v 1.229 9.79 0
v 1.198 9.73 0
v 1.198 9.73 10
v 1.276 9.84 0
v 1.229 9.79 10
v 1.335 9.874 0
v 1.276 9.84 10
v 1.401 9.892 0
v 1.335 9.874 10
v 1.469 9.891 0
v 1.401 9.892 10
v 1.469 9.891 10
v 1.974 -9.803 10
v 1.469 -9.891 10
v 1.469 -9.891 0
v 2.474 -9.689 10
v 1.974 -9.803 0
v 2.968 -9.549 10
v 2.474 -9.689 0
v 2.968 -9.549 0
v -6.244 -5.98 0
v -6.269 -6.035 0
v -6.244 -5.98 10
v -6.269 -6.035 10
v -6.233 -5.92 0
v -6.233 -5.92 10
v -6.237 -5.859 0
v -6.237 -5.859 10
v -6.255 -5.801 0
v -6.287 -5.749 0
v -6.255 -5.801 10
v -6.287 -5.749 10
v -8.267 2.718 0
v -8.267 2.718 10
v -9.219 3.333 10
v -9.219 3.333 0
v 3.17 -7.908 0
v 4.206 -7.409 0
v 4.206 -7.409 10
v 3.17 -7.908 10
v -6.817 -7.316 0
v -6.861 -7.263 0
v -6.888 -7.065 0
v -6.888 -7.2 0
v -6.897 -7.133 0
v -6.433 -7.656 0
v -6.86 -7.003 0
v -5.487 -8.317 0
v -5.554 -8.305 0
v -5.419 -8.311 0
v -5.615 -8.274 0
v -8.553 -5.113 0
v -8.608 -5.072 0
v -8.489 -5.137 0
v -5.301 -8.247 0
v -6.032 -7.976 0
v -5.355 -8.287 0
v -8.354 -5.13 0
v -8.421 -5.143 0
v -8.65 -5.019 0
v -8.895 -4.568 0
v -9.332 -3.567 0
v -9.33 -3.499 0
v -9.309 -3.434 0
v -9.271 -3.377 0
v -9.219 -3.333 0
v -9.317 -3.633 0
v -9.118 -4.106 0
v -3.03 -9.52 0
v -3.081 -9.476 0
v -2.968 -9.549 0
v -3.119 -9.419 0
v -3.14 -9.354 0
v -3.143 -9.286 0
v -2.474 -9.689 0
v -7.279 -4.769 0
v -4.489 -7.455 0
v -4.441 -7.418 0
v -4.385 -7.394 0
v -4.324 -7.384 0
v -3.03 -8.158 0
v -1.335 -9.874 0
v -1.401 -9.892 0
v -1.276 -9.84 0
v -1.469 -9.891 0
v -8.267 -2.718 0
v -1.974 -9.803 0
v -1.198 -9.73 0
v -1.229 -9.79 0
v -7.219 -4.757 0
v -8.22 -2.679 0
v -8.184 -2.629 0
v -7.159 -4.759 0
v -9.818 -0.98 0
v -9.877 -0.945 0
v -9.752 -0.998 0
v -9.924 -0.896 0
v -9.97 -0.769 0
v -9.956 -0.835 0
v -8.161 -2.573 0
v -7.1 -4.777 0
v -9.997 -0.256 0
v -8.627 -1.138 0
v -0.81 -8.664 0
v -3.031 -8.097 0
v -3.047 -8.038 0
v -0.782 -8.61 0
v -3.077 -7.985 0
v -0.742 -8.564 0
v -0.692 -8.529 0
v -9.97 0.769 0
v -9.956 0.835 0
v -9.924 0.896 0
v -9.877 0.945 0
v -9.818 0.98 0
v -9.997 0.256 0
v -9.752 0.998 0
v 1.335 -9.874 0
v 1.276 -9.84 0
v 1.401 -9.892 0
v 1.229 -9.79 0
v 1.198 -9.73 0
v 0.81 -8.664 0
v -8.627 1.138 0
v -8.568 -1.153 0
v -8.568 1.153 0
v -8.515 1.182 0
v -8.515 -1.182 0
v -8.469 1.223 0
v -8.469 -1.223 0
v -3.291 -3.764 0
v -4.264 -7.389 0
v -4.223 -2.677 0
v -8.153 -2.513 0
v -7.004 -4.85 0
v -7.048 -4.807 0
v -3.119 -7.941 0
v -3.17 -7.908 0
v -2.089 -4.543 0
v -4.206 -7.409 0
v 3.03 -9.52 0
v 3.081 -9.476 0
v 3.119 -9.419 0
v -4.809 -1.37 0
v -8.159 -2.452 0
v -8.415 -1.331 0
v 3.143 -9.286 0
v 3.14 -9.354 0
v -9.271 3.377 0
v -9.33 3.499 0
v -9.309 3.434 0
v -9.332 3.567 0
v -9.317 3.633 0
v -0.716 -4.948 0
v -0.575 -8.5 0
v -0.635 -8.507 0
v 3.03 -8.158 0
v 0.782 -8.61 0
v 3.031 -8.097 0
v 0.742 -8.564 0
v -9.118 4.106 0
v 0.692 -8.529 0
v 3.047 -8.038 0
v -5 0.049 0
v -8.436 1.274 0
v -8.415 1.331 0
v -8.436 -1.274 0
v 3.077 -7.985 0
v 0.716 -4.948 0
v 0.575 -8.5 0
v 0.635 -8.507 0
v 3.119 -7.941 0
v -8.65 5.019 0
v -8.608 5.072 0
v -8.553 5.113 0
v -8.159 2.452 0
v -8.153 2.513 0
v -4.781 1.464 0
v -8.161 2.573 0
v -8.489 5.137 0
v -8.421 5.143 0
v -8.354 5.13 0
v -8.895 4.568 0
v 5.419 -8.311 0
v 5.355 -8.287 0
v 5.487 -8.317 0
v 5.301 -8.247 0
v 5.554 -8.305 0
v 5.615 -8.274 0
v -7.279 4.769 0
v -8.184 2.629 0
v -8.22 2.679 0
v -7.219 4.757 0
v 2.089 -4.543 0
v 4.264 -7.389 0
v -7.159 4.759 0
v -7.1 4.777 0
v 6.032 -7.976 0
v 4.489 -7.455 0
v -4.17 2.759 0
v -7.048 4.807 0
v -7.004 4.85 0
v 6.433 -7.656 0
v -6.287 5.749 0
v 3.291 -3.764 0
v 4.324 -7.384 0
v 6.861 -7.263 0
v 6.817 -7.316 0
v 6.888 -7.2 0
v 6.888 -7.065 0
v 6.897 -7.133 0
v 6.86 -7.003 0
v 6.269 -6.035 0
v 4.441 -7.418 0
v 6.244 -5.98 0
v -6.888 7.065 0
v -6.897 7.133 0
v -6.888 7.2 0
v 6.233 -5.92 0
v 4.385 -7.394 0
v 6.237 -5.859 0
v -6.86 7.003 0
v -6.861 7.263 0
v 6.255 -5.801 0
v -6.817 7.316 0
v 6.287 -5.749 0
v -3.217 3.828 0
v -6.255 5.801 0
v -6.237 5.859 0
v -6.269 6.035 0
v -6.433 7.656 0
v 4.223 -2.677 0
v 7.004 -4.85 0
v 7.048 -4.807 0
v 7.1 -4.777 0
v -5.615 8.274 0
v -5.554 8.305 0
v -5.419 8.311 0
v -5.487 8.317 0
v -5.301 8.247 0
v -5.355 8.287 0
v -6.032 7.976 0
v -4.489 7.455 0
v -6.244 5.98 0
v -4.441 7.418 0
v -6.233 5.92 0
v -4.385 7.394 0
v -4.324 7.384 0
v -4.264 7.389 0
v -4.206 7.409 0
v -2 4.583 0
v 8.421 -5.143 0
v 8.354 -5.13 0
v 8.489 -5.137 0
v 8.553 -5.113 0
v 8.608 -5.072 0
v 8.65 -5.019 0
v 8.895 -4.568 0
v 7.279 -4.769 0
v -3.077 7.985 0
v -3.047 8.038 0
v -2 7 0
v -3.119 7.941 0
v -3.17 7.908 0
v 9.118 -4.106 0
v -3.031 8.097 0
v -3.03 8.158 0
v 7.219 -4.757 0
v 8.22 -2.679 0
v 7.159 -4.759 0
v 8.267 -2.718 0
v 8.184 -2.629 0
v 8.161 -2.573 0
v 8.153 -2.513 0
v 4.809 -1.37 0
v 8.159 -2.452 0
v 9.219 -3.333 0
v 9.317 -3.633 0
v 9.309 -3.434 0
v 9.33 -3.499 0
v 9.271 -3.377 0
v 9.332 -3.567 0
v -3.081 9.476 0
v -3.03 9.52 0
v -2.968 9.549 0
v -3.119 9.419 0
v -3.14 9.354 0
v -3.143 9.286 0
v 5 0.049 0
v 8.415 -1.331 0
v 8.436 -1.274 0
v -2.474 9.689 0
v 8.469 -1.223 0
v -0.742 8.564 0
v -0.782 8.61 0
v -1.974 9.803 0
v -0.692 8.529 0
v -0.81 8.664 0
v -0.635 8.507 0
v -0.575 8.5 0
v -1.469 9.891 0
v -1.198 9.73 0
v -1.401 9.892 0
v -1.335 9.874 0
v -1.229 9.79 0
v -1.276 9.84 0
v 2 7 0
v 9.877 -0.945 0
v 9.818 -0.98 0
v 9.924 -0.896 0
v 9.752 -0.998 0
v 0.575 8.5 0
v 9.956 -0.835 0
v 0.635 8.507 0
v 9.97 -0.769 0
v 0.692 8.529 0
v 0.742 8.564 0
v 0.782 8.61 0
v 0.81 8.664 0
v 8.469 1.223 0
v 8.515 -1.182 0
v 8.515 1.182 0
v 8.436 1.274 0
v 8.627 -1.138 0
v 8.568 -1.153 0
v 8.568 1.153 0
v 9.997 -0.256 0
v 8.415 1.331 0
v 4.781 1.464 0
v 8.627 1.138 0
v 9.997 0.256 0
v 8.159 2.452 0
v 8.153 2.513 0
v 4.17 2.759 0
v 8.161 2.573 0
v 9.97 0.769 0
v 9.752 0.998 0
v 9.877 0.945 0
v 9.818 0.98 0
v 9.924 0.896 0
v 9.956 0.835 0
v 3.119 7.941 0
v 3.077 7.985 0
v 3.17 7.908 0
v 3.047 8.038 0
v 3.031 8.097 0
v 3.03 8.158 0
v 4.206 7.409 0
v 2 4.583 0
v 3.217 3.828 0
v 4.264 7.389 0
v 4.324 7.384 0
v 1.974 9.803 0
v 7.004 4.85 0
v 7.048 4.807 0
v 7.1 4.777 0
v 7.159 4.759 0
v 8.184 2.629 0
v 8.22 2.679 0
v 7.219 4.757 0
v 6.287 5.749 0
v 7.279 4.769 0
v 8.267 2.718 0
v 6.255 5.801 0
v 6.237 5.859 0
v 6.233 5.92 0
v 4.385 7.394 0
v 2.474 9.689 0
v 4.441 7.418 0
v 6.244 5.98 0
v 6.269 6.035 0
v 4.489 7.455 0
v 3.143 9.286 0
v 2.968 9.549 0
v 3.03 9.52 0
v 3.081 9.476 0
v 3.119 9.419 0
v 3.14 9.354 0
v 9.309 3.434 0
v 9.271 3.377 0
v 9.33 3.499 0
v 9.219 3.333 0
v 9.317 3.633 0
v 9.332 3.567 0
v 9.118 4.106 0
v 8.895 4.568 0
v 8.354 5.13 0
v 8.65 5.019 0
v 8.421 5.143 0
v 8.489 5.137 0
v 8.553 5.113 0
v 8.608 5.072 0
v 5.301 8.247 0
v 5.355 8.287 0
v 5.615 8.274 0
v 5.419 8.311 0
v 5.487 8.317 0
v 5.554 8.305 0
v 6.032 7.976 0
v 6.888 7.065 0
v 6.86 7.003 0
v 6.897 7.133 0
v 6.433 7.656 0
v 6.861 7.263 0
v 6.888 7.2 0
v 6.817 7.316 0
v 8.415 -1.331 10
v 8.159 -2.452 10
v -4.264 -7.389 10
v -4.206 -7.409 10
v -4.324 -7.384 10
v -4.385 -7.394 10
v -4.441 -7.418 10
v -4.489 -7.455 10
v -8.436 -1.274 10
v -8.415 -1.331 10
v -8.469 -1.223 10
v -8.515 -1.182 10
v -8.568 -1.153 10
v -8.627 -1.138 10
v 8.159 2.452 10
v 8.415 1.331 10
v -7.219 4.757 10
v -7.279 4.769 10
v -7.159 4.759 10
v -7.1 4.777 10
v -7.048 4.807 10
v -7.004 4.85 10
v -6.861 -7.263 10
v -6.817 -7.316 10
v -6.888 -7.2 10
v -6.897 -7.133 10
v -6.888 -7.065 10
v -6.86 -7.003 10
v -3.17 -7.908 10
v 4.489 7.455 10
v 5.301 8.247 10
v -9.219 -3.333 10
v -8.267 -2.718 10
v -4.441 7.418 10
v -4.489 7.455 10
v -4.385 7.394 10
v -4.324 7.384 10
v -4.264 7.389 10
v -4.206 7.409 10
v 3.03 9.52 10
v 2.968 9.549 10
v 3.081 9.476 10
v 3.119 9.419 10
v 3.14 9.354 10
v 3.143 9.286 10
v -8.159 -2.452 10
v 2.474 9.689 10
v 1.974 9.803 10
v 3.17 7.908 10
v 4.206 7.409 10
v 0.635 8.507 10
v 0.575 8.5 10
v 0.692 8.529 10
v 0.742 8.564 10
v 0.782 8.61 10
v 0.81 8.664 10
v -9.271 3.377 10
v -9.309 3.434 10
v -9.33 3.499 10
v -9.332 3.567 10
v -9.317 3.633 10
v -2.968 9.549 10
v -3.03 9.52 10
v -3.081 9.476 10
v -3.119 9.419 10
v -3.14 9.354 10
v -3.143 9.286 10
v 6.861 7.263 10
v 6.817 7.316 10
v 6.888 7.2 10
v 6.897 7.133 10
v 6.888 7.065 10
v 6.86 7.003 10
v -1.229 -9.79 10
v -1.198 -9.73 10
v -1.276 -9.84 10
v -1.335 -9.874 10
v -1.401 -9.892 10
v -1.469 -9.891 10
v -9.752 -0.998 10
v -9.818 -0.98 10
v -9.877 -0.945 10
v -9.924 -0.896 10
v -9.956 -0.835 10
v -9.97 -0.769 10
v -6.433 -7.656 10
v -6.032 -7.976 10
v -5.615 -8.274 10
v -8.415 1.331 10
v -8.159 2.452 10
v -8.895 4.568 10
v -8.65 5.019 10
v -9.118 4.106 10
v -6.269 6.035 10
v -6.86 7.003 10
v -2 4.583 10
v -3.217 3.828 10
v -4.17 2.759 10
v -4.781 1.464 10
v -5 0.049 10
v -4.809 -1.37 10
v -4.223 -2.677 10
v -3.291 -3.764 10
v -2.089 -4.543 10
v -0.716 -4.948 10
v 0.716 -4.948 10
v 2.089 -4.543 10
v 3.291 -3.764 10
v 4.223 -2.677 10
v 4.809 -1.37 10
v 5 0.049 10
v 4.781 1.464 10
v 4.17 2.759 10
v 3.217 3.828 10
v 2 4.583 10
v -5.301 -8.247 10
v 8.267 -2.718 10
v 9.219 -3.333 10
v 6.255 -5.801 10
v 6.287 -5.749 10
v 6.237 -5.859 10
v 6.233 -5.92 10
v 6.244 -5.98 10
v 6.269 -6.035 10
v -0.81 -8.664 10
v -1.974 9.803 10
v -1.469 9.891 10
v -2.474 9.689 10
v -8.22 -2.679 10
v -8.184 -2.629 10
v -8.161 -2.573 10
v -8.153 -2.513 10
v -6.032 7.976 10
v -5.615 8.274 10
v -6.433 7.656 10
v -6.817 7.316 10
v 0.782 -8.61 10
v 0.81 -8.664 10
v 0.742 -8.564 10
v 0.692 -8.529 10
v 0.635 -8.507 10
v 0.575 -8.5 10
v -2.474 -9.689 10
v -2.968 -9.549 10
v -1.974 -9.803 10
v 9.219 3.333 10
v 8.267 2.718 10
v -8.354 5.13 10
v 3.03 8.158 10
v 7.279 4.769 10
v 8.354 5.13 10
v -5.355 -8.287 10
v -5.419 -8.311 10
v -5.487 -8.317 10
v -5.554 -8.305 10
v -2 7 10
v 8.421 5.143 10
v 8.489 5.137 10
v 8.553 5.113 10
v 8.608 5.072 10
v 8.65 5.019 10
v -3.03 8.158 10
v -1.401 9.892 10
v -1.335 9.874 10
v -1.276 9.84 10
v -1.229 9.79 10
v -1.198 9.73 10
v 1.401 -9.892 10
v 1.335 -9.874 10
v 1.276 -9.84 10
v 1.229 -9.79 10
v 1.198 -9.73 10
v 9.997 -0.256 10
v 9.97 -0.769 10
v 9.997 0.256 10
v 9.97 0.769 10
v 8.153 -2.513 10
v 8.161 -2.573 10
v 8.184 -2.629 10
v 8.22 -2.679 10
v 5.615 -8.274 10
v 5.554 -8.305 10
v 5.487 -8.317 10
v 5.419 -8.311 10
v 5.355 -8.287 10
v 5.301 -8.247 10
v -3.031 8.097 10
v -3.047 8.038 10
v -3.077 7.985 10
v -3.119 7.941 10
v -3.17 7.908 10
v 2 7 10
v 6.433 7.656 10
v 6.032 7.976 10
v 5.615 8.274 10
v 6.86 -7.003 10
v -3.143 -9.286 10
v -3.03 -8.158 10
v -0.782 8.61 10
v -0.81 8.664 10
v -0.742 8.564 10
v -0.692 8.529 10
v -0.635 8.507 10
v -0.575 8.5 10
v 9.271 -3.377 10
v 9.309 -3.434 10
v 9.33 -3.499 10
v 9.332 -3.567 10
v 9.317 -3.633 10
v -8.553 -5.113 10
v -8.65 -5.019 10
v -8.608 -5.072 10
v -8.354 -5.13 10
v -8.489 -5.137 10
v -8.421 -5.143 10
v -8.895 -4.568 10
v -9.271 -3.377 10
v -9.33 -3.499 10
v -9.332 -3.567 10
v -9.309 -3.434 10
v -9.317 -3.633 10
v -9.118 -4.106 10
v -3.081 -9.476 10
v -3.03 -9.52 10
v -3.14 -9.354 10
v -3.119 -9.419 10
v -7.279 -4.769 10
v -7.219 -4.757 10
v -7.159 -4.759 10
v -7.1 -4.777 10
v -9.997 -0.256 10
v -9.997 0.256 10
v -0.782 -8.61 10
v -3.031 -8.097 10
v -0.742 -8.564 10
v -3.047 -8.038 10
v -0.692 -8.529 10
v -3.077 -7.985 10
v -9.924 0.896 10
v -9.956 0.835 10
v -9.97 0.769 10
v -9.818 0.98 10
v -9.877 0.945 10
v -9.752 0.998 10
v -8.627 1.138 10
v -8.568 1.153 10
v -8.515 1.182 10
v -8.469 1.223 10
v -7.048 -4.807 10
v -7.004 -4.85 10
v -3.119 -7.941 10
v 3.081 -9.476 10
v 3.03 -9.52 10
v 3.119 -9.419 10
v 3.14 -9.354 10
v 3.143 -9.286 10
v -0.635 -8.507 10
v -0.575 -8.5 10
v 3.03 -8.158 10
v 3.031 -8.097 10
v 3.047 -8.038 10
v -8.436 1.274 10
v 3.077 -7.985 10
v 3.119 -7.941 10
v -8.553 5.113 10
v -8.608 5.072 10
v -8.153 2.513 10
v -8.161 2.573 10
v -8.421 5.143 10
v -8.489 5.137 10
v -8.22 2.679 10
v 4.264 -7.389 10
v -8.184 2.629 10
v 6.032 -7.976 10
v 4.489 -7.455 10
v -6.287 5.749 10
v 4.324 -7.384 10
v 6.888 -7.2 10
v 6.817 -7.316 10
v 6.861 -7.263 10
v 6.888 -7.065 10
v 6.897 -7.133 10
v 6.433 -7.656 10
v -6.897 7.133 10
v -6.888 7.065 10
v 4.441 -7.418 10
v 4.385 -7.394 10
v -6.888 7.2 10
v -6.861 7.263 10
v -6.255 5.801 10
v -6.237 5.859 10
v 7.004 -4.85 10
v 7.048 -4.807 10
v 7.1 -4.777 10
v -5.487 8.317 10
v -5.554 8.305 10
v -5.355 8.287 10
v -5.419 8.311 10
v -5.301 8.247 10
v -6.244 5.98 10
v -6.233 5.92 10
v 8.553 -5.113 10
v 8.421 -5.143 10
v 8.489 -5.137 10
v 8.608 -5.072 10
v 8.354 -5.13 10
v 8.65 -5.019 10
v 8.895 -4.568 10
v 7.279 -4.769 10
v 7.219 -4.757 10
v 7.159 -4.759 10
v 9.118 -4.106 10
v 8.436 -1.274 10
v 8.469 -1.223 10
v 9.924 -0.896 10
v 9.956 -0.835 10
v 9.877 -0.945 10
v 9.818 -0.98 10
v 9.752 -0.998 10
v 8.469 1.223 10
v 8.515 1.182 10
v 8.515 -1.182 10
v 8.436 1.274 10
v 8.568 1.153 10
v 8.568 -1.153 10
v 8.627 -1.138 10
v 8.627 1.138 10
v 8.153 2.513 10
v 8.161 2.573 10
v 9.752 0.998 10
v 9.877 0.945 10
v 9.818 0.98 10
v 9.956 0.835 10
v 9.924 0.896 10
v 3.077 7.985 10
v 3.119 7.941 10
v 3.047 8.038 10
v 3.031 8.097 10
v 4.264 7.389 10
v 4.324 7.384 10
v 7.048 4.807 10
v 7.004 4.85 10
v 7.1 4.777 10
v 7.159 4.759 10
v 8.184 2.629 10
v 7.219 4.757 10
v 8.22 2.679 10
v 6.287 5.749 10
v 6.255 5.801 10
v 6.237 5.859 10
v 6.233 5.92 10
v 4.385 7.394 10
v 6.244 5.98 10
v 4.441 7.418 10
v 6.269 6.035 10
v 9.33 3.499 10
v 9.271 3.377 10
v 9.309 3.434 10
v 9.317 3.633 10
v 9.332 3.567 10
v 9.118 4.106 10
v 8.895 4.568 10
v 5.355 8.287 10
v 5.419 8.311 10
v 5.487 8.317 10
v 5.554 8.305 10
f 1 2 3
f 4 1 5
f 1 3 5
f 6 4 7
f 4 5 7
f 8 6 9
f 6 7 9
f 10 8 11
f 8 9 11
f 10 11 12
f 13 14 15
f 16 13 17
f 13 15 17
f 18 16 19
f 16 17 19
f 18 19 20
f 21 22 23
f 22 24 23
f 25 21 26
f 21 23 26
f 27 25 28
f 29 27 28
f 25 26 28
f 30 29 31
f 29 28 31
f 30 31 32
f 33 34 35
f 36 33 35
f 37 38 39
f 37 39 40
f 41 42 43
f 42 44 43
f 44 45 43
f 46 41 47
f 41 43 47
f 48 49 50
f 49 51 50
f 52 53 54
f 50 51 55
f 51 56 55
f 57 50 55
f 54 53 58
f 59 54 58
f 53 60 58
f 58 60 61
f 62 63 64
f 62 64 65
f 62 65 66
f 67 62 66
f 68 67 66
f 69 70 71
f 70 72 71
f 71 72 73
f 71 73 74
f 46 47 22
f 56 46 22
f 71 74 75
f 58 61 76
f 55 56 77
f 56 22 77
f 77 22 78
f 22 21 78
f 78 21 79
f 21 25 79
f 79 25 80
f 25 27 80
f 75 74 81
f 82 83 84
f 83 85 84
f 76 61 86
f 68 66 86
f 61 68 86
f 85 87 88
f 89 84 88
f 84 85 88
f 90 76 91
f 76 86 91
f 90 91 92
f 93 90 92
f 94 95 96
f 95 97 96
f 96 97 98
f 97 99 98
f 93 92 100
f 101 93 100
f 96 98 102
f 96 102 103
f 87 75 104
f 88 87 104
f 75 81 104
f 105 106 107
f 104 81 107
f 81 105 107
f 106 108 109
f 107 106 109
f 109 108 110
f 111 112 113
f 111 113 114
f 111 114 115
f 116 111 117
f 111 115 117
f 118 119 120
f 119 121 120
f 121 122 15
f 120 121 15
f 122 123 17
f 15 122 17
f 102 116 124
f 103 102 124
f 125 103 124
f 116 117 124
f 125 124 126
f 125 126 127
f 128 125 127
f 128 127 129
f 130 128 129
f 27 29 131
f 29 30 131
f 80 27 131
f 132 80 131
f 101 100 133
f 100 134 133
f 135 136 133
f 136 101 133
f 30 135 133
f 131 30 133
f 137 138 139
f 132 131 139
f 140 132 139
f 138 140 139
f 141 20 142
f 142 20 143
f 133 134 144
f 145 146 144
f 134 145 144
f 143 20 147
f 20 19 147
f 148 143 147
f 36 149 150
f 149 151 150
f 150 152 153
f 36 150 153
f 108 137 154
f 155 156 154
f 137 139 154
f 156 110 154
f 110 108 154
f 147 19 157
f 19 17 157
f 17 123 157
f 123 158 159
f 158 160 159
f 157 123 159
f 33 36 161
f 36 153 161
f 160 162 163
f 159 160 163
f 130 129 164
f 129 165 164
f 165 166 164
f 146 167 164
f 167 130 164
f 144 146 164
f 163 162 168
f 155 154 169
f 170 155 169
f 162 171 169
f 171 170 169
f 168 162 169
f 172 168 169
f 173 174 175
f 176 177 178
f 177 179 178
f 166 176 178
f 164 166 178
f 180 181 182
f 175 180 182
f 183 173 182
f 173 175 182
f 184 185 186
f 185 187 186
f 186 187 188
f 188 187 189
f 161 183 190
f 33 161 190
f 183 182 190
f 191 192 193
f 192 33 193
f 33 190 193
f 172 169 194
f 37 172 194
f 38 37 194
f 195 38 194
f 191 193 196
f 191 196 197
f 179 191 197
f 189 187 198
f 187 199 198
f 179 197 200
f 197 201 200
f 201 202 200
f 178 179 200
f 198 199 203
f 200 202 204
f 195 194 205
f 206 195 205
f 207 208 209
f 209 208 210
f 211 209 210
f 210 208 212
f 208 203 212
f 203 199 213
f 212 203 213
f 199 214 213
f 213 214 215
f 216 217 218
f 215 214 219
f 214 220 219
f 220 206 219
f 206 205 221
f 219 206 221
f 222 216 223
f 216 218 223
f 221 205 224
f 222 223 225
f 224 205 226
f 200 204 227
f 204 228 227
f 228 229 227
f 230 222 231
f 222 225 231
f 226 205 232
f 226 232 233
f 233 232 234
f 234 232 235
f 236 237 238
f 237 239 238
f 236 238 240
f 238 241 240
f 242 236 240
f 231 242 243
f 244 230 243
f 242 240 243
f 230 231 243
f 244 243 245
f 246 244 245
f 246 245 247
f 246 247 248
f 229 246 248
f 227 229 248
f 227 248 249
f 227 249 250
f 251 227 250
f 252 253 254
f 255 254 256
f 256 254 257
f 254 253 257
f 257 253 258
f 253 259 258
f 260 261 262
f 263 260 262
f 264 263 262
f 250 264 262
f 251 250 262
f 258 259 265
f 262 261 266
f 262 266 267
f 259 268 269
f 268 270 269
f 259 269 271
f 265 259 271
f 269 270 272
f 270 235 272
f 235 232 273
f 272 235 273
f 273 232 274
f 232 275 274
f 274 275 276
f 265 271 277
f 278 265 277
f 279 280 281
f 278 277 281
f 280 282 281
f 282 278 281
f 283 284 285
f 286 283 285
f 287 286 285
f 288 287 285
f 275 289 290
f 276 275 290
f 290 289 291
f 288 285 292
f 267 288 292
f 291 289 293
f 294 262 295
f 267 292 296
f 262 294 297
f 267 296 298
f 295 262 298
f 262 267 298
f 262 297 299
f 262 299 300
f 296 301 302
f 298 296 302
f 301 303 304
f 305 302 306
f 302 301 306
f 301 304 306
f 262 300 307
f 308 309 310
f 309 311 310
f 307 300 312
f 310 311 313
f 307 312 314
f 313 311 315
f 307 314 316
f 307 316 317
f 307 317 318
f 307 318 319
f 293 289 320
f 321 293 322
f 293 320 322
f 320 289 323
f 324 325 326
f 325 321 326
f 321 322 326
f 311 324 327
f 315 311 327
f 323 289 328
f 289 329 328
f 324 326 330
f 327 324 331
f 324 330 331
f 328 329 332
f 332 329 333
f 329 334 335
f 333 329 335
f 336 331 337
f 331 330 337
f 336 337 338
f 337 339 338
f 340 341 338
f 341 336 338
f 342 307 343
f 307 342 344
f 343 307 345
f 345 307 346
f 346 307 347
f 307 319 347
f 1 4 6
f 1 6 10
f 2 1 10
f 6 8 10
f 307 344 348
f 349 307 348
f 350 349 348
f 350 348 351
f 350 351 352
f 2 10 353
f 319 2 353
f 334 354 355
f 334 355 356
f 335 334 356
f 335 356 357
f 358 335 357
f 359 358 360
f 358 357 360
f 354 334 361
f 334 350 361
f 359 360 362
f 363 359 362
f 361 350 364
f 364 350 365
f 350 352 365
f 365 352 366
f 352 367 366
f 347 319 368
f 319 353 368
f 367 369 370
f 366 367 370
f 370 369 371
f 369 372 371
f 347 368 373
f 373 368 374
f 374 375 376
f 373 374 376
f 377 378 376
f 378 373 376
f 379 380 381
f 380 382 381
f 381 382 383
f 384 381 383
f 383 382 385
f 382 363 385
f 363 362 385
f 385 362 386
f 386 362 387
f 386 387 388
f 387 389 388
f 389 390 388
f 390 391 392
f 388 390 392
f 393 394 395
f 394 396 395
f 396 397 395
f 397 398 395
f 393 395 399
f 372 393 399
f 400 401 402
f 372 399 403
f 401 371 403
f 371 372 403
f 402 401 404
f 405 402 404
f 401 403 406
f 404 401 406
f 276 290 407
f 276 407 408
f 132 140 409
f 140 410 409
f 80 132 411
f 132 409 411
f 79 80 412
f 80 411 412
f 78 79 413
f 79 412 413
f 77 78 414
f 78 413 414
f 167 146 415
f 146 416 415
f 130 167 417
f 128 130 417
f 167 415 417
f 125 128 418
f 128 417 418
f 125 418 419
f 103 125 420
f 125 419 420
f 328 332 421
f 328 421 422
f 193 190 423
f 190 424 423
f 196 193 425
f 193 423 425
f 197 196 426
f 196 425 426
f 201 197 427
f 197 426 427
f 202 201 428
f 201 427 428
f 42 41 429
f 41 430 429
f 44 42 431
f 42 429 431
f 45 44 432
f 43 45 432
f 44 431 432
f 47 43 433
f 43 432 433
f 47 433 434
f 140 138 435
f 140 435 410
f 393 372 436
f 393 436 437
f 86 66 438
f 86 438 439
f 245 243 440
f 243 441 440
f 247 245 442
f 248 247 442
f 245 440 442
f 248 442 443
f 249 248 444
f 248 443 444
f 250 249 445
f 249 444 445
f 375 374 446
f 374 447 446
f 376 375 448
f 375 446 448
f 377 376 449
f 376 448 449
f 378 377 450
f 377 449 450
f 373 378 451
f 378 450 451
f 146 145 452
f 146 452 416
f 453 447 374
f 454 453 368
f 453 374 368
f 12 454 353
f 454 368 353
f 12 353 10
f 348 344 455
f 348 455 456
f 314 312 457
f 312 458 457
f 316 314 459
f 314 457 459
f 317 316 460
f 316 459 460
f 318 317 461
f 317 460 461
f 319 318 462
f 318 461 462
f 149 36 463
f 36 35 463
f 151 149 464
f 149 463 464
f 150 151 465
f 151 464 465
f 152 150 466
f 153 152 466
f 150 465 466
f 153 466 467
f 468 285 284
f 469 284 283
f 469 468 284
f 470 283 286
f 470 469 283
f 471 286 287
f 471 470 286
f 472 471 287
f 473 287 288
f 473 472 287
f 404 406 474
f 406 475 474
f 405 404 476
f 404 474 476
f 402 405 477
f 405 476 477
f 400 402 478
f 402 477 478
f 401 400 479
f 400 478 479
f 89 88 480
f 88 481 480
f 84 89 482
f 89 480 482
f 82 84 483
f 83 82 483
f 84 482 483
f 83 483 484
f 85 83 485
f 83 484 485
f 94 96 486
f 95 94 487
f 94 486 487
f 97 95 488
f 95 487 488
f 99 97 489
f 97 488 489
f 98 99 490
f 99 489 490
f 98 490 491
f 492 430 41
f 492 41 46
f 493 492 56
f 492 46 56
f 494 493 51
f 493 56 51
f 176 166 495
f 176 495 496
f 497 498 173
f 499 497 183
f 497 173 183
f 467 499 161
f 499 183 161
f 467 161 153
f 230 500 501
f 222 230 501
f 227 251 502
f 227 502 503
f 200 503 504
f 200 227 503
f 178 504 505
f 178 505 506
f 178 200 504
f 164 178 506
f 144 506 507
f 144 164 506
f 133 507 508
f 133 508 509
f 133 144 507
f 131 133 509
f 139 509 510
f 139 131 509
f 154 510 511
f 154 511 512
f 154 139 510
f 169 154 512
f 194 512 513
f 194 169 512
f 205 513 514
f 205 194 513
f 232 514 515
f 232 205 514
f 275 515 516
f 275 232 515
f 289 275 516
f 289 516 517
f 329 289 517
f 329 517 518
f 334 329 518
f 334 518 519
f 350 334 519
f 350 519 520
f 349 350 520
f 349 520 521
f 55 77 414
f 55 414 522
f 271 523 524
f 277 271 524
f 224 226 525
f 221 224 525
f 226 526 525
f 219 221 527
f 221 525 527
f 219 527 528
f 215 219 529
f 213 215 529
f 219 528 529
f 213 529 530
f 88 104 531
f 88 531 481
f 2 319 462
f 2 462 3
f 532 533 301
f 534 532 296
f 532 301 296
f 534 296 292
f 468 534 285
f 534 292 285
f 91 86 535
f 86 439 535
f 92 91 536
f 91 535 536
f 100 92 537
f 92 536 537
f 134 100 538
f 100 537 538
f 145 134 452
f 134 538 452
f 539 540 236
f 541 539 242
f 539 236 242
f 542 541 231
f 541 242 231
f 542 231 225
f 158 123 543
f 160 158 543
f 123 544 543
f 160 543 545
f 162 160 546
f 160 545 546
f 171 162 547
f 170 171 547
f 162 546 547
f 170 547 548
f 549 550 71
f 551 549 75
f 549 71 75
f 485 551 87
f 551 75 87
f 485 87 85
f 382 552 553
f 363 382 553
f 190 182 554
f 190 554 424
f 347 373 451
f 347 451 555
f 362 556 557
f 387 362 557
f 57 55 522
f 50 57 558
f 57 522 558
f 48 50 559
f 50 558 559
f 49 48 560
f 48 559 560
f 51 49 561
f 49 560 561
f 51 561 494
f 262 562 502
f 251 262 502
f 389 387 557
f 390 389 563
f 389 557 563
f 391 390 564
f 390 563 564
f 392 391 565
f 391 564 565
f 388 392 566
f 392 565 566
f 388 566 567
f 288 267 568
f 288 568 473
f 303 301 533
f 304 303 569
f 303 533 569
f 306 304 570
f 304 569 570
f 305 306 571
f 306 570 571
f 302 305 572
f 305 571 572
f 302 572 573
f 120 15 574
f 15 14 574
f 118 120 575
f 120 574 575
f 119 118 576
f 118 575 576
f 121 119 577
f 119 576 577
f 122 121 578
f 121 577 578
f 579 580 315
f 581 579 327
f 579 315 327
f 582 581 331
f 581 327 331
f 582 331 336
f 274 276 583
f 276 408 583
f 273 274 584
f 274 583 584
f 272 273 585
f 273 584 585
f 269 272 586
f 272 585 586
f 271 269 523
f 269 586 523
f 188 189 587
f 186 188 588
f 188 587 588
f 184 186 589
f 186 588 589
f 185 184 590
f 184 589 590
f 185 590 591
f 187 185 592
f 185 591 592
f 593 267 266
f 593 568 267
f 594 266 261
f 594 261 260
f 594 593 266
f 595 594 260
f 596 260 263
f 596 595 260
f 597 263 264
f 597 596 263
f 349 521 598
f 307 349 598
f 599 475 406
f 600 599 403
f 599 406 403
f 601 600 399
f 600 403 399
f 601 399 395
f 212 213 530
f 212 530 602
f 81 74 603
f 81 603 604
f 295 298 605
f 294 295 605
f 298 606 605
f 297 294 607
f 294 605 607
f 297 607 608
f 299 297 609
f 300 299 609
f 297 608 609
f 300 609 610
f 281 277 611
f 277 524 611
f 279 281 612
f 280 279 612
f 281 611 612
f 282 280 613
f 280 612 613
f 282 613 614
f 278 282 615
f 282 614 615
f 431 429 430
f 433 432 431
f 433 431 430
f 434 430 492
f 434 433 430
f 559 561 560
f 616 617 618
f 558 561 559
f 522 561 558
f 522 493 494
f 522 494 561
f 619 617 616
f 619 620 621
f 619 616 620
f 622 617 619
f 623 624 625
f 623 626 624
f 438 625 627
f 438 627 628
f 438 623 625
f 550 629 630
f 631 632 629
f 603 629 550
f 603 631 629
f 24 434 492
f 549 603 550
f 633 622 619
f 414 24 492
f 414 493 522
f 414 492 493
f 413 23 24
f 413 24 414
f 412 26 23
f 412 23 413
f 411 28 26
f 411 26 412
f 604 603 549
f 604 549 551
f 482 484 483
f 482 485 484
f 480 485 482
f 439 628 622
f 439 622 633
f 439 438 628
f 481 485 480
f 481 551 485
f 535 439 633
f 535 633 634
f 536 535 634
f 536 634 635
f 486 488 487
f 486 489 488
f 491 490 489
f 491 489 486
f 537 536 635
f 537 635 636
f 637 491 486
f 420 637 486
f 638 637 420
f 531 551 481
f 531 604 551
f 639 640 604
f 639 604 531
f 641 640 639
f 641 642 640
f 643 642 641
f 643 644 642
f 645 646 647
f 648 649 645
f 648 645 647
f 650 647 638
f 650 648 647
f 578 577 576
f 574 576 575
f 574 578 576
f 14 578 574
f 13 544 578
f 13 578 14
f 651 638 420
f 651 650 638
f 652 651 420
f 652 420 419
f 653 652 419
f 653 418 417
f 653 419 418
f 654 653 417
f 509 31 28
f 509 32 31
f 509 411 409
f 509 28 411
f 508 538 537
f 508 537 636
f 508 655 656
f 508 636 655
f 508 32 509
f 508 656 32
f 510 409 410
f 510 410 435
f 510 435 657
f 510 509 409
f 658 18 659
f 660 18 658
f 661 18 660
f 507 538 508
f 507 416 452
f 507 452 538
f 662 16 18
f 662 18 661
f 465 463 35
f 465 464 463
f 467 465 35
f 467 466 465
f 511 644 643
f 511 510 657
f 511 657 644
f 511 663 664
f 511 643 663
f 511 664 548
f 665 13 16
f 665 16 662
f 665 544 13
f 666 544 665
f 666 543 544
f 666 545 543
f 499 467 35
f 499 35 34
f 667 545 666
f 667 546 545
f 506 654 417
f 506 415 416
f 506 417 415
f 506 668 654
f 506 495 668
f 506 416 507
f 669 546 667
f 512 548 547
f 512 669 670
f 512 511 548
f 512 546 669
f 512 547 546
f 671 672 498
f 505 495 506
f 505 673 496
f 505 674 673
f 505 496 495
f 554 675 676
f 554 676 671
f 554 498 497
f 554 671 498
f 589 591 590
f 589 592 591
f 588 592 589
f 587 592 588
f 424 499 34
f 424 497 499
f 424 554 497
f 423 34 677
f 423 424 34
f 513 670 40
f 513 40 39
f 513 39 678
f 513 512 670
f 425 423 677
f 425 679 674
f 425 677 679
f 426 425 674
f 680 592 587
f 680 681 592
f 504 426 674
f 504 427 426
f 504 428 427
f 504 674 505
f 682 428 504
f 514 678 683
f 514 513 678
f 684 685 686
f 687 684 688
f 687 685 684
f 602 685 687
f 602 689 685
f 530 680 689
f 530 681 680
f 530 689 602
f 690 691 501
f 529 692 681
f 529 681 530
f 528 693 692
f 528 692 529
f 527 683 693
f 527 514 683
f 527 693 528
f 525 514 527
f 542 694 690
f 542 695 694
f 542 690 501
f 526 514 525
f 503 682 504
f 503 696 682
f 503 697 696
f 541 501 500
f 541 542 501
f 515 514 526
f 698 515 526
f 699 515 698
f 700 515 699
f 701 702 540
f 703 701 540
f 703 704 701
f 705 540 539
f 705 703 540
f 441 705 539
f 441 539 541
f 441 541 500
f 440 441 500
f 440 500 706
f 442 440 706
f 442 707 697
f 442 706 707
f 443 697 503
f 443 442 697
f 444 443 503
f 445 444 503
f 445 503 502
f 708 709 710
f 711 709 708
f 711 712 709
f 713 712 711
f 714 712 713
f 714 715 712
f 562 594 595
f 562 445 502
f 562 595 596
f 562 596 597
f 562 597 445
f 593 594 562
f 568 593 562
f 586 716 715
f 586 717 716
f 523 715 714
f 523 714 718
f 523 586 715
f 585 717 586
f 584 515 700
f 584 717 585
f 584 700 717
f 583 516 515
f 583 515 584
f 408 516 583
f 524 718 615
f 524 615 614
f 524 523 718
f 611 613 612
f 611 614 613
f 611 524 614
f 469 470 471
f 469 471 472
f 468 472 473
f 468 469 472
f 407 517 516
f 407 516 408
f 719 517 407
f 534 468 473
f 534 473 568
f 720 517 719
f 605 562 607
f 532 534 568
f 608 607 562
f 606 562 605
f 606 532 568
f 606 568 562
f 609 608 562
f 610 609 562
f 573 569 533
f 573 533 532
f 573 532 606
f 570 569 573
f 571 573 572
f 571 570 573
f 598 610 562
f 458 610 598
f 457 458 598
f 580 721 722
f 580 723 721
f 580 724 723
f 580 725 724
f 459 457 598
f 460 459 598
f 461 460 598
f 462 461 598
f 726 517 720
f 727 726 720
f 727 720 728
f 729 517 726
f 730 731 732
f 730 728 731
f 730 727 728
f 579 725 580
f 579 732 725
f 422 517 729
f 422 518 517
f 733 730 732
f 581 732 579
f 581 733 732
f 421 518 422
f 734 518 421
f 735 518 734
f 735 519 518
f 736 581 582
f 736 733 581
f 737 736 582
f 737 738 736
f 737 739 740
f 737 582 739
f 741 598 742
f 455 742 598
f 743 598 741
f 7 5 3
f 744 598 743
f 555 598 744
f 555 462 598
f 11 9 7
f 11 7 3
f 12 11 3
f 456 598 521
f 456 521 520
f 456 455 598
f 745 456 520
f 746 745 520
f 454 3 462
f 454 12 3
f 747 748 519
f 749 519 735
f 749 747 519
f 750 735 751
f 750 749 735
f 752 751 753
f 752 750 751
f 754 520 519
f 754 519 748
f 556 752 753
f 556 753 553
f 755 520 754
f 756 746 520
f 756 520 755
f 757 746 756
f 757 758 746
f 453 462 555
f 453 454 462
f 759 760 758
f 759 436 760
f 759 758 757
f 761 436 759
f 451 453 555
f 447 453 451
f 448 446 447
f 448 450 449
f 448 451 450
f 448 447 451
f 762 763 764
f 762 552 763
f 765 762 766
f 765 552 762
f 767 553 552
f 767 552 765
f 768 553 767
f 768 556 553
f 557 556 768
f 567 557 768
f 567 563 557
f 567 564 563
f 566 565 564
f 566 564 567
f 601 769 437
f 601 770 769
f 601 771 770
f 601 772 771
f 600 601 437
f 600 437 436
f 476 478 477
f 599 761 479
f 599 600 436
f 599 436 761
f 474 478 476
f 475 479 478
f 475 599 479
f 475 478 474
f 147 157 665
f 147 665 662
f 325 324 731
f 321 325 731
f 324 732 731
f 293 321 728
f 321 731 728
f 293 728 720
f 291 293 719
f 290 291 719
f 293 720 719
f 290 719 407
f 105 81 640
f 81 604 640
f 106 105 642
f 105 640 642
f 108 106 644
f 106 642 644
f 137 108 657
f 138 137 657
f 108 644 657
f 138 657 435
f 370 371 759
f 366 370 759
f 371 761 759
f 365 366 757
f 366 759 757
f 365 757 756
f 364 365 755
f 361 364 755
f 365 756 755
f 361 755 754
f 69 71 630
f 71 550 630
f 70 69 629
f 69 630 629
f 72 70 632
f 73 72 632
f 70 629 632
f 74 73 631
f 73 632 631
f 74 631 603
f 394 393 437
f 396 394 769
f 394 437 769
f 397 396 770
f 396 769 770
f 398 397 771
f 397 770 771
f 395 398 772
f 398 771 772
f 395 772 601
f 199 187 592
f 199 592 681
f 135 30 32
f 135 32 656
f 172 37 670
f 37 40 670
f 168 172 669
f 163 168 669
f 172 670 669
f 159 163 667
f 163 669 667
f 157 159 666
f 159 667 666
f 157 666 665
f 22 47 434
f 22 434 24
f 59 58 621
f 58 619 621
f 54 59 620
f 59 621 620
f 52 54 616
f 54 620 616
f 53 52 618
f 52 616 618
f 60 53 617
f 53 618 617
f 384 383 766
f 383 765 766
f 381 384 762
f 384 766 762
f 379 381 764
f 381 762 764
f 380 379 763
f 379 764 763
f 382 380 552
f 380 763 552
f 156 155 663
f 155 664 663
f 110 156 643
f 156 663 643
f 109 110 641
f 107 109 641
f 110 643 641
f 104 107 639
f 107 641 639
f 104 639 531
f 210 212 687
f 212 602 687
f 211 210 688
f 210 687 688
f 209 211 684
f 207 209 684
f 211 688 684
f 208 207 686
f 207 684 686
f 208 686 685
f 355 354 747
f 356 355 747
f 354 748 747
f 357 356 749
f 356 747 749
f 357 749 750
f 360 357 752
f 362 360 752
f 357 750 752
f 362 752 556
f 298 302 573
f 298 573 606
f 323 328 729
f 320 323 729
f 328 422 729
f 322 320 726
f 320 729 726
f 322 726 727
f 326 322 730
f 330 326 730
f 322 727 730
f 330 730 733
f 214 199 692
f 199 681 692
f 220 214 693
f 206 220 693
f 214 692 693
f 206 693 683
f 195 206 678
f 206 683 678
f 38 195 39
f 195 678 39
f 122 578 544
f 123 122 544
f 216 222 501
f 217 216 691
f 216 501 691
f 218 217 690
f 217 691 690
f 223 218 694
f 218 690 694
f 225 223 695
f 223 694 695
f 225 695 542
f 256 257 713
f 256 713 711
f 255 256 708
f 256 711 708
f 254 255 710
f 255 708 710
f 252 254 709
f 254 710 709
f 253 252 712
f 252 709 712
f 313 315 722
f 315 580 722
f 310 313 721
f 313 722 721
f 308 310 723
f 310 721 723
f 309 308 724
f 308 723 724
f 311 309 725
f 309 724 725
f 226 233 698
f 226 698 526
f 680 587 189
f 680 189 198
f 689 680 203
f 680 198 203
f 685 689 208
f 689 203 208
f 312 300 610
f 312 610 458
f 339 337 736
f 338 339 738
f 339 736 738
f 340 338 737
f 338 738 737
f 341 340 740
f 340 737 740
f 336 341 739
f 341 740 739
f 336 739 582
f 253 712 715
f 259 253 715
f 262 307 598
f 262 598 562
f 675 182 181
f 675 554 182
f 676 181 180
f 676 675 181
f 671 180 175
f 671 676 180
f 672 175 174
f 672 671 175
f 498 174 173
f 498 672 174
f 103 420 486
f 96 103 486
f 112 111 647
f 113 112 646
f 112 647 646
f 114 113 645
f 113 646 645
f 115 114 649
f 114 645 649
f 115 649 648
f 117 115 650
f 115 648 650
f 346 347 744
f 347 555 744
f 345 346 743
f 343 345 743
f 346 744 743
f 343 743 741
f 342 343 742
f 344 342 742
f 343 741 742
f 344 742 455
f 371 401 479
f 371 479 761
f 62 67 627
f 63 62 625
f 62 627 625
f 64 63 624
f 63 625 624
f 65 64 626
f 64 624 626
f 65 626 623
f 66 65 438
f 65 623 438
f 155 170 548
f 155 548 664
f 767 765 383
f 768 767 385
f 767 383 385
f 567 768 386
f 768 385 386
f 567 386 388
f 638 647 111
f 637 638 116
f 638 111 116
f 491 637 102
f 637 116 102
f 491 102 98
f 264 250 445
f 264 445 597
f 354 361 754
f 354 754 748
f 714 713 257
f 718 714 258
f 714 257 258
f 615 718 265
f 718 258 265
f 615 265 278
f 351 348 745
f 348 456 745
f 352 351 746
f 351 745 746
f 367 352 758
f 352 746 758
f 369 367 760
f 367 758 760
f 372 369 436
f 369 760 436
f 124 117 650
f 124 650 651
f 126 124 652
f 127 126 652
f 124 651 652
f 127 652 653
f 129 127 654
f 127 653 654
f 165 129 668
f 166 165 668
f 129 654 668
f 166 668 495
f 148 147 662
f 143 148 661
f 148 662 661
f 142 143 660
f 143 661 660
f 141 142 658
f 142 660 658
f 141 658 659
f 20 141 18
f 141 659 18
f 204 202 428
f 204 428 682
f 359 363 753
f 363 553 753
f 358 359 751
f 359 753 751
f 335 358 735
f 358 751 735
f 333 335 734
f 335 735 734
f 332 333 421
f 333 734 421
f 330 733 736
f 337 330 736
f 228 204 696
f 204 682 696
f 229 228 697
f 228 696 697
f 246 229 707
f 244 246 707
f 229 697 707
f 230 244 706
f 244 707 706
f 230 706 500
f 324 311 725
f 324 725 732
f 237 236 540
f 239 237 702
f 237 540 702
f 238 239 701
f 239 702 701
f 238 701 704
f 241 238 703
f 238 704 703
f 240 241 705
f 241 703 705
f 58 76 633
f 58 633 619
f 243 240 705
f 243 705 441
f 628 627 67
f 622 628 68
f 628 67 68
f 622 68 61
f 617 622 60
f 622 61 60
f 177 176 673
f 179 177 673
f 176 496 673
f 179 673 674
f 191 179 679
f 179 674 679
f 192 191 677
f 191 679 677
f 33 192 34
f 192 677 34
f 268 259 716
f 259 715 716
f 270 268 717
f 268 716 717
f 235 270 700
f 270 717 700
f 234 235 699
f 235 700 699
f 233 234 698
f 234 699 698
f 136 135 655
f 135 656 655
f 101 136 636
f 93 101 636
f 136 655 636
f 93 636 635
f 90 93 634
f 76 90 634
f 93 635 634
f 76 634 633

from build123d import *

# Parameters (mm, degrees)
SKETCH2_R           = 10
BOSS_EXTRUDE1_DEPTH = 10
CUT_EXTRUDE1_START  = -11
CUT_EXTRUDE1_DEPTH  = 12
CIRPATTERN1_COUNT   = 14
FILLET1_R           = 0.25


with BuildPart() as part:
    # Sketch2 → Boss-Extrude1 (new body)
    with BuildSketch(Plane.XY):
        Circle(SKETCH2_R)
        with BuildLine():
            Line((2, 4.582575695), (2, 7))
            Line((2, 7), (-2, 7))
            Line((-2, 7), (-2, 4.582575695))
            ThreePointArc((-2, 4.582575695), (0, -5), (2, 4.582575695))
        make_face(mode=Mode.SUBTRACT)
    extrude(amount=BOSS_EXTRUDE1_DEPTH)

    # Sketch3 → Cut-Extrude1 (cut)
    with BuildSketch(Plane.XY.offset(10).offset(CUT_EXTRUDE1_START)):
        Polygon((-20.341084154, 62.326061337), (-1.266640021, 9.919456792), (-0.75, 8.5), (0.75, 8.5), (1.266640021, 9.919456792), (20.341084154, 62.326061337), (20.341084154, 173.86594871), (-20.341084154, 173.86594871), align=None)
    cut_extrude1 = extrude(amount=CUT_EXTRUDE1_DEPTH, mode=Mode.SUBTRACT)

    # CirPattern1: Cut-Extrude1 ×14 about axis
    cirpattern1_axis = Axis((0, 0, 0), (0, 0, 1))
    for i in range(1, CIRPATTERN1_COUNT):
        add(cut_extrude1.rotate(cirpattern1_axis, i * 360 / CIRPATTERN1_COUNT), mode=Mode.SUBTRACT)

    # Fillet1
    fillet1_edges = [part.edges().sort_by_distance(p)[0] for p in [
        (7.113184952, 4.713289704, 5),
        (6.17795025, 5.886036928, 5),
        (8.453777954, 1.160232004, 5),
        (8.119996553, 2.622623873, 5),
        (8.119996553, -2.622623873, 5),
        (8.453777954, -1.160232004, 5),
        (6.17795025, -5.886036928, 5),
        (7.113184952, -4.713289704, 5),
        (3.012285132, -7.983648182, 5),
        (4.363738433, -7.332822573, 5),
        (-0.75, -8.5, 5),
        (0.75, -8.5, 5),
        (-4.363738433, -7.332822573, 5),
        (-3.012285132, -7.983648182, 5),
        (-7.113184952, -4.713289704, 5),
        (-6.17795025, -5.886036928, 5),
        (-8.453777954, -1.160232004, 5),
        (-8.119996553, -2.622623873, 5),
        (-8.119996553, 2.622623873, 5),
        (-8.453777954, 1.160232004, 5),
        (-6.17795025, 5.886036928, 5),
        (-7.113184952, 4.713289704, 5),
        (-3.012285132, 7.983648182, 5),
        (-4.363738433, 7.332822573, 5),
        (4.363738433, 7.332822573, 5),
        (3.012285132, 7.983648182, 5),
        (0.75, 8.5, 5),
        (-0.75, 8.5, 5),
        (-1.266640021, 9.919456792, 5),
        (1.266640021, 9.919456792, 5),
        (5.445094229, 8.387547248, 5),
        (3.162687777, 9.486696265, 5),
        (-3.162687777, 9.486696265, 5),
        (-5.445094229, 8.387547248, 5),
        (-6.965606473, 7.174979196, 5),
        (-8.545080745, 5.194381104, 5),
        (-9.38890138, 3.442169501, 5),
        (-9.952609221, 0.972404078, 5),
        (-9.952609221, -0.972404078, 5),
        (-9.38890138, -3.442169501, 5),
        (-8.545080745, -5.194381104, 5),
        (-6.965606473, -7.174979196, 5),
        (-5.445094229, -8.387547248, 5),
        (-3.162687777, -9.486696265, 5),
        (-1.266640021, -9.919456792, 5),
        (1.266640021, -9.919456792, 5),
        (3.162687777, -9.486696265, 5),
        (5.445094229, -8.387547248, 5),
        (6.965606473, -7.174979196, 5),
        (8.545080745, -5.194381104, 5),
        (9.38890138, -3.442169501, 5),
        (9.952609221, -0.972404078, 5),
        (9.952609221, 0.972404078, 5),
        (9.38890138, 3.442169501, 5),
        (8.545080745, 5.194381104, 5),
        (6.965606473, 7.174979196, 5),
    ]]
    fillet(fillet1_edges, radius=FILLET1_R)


solid = part.part
